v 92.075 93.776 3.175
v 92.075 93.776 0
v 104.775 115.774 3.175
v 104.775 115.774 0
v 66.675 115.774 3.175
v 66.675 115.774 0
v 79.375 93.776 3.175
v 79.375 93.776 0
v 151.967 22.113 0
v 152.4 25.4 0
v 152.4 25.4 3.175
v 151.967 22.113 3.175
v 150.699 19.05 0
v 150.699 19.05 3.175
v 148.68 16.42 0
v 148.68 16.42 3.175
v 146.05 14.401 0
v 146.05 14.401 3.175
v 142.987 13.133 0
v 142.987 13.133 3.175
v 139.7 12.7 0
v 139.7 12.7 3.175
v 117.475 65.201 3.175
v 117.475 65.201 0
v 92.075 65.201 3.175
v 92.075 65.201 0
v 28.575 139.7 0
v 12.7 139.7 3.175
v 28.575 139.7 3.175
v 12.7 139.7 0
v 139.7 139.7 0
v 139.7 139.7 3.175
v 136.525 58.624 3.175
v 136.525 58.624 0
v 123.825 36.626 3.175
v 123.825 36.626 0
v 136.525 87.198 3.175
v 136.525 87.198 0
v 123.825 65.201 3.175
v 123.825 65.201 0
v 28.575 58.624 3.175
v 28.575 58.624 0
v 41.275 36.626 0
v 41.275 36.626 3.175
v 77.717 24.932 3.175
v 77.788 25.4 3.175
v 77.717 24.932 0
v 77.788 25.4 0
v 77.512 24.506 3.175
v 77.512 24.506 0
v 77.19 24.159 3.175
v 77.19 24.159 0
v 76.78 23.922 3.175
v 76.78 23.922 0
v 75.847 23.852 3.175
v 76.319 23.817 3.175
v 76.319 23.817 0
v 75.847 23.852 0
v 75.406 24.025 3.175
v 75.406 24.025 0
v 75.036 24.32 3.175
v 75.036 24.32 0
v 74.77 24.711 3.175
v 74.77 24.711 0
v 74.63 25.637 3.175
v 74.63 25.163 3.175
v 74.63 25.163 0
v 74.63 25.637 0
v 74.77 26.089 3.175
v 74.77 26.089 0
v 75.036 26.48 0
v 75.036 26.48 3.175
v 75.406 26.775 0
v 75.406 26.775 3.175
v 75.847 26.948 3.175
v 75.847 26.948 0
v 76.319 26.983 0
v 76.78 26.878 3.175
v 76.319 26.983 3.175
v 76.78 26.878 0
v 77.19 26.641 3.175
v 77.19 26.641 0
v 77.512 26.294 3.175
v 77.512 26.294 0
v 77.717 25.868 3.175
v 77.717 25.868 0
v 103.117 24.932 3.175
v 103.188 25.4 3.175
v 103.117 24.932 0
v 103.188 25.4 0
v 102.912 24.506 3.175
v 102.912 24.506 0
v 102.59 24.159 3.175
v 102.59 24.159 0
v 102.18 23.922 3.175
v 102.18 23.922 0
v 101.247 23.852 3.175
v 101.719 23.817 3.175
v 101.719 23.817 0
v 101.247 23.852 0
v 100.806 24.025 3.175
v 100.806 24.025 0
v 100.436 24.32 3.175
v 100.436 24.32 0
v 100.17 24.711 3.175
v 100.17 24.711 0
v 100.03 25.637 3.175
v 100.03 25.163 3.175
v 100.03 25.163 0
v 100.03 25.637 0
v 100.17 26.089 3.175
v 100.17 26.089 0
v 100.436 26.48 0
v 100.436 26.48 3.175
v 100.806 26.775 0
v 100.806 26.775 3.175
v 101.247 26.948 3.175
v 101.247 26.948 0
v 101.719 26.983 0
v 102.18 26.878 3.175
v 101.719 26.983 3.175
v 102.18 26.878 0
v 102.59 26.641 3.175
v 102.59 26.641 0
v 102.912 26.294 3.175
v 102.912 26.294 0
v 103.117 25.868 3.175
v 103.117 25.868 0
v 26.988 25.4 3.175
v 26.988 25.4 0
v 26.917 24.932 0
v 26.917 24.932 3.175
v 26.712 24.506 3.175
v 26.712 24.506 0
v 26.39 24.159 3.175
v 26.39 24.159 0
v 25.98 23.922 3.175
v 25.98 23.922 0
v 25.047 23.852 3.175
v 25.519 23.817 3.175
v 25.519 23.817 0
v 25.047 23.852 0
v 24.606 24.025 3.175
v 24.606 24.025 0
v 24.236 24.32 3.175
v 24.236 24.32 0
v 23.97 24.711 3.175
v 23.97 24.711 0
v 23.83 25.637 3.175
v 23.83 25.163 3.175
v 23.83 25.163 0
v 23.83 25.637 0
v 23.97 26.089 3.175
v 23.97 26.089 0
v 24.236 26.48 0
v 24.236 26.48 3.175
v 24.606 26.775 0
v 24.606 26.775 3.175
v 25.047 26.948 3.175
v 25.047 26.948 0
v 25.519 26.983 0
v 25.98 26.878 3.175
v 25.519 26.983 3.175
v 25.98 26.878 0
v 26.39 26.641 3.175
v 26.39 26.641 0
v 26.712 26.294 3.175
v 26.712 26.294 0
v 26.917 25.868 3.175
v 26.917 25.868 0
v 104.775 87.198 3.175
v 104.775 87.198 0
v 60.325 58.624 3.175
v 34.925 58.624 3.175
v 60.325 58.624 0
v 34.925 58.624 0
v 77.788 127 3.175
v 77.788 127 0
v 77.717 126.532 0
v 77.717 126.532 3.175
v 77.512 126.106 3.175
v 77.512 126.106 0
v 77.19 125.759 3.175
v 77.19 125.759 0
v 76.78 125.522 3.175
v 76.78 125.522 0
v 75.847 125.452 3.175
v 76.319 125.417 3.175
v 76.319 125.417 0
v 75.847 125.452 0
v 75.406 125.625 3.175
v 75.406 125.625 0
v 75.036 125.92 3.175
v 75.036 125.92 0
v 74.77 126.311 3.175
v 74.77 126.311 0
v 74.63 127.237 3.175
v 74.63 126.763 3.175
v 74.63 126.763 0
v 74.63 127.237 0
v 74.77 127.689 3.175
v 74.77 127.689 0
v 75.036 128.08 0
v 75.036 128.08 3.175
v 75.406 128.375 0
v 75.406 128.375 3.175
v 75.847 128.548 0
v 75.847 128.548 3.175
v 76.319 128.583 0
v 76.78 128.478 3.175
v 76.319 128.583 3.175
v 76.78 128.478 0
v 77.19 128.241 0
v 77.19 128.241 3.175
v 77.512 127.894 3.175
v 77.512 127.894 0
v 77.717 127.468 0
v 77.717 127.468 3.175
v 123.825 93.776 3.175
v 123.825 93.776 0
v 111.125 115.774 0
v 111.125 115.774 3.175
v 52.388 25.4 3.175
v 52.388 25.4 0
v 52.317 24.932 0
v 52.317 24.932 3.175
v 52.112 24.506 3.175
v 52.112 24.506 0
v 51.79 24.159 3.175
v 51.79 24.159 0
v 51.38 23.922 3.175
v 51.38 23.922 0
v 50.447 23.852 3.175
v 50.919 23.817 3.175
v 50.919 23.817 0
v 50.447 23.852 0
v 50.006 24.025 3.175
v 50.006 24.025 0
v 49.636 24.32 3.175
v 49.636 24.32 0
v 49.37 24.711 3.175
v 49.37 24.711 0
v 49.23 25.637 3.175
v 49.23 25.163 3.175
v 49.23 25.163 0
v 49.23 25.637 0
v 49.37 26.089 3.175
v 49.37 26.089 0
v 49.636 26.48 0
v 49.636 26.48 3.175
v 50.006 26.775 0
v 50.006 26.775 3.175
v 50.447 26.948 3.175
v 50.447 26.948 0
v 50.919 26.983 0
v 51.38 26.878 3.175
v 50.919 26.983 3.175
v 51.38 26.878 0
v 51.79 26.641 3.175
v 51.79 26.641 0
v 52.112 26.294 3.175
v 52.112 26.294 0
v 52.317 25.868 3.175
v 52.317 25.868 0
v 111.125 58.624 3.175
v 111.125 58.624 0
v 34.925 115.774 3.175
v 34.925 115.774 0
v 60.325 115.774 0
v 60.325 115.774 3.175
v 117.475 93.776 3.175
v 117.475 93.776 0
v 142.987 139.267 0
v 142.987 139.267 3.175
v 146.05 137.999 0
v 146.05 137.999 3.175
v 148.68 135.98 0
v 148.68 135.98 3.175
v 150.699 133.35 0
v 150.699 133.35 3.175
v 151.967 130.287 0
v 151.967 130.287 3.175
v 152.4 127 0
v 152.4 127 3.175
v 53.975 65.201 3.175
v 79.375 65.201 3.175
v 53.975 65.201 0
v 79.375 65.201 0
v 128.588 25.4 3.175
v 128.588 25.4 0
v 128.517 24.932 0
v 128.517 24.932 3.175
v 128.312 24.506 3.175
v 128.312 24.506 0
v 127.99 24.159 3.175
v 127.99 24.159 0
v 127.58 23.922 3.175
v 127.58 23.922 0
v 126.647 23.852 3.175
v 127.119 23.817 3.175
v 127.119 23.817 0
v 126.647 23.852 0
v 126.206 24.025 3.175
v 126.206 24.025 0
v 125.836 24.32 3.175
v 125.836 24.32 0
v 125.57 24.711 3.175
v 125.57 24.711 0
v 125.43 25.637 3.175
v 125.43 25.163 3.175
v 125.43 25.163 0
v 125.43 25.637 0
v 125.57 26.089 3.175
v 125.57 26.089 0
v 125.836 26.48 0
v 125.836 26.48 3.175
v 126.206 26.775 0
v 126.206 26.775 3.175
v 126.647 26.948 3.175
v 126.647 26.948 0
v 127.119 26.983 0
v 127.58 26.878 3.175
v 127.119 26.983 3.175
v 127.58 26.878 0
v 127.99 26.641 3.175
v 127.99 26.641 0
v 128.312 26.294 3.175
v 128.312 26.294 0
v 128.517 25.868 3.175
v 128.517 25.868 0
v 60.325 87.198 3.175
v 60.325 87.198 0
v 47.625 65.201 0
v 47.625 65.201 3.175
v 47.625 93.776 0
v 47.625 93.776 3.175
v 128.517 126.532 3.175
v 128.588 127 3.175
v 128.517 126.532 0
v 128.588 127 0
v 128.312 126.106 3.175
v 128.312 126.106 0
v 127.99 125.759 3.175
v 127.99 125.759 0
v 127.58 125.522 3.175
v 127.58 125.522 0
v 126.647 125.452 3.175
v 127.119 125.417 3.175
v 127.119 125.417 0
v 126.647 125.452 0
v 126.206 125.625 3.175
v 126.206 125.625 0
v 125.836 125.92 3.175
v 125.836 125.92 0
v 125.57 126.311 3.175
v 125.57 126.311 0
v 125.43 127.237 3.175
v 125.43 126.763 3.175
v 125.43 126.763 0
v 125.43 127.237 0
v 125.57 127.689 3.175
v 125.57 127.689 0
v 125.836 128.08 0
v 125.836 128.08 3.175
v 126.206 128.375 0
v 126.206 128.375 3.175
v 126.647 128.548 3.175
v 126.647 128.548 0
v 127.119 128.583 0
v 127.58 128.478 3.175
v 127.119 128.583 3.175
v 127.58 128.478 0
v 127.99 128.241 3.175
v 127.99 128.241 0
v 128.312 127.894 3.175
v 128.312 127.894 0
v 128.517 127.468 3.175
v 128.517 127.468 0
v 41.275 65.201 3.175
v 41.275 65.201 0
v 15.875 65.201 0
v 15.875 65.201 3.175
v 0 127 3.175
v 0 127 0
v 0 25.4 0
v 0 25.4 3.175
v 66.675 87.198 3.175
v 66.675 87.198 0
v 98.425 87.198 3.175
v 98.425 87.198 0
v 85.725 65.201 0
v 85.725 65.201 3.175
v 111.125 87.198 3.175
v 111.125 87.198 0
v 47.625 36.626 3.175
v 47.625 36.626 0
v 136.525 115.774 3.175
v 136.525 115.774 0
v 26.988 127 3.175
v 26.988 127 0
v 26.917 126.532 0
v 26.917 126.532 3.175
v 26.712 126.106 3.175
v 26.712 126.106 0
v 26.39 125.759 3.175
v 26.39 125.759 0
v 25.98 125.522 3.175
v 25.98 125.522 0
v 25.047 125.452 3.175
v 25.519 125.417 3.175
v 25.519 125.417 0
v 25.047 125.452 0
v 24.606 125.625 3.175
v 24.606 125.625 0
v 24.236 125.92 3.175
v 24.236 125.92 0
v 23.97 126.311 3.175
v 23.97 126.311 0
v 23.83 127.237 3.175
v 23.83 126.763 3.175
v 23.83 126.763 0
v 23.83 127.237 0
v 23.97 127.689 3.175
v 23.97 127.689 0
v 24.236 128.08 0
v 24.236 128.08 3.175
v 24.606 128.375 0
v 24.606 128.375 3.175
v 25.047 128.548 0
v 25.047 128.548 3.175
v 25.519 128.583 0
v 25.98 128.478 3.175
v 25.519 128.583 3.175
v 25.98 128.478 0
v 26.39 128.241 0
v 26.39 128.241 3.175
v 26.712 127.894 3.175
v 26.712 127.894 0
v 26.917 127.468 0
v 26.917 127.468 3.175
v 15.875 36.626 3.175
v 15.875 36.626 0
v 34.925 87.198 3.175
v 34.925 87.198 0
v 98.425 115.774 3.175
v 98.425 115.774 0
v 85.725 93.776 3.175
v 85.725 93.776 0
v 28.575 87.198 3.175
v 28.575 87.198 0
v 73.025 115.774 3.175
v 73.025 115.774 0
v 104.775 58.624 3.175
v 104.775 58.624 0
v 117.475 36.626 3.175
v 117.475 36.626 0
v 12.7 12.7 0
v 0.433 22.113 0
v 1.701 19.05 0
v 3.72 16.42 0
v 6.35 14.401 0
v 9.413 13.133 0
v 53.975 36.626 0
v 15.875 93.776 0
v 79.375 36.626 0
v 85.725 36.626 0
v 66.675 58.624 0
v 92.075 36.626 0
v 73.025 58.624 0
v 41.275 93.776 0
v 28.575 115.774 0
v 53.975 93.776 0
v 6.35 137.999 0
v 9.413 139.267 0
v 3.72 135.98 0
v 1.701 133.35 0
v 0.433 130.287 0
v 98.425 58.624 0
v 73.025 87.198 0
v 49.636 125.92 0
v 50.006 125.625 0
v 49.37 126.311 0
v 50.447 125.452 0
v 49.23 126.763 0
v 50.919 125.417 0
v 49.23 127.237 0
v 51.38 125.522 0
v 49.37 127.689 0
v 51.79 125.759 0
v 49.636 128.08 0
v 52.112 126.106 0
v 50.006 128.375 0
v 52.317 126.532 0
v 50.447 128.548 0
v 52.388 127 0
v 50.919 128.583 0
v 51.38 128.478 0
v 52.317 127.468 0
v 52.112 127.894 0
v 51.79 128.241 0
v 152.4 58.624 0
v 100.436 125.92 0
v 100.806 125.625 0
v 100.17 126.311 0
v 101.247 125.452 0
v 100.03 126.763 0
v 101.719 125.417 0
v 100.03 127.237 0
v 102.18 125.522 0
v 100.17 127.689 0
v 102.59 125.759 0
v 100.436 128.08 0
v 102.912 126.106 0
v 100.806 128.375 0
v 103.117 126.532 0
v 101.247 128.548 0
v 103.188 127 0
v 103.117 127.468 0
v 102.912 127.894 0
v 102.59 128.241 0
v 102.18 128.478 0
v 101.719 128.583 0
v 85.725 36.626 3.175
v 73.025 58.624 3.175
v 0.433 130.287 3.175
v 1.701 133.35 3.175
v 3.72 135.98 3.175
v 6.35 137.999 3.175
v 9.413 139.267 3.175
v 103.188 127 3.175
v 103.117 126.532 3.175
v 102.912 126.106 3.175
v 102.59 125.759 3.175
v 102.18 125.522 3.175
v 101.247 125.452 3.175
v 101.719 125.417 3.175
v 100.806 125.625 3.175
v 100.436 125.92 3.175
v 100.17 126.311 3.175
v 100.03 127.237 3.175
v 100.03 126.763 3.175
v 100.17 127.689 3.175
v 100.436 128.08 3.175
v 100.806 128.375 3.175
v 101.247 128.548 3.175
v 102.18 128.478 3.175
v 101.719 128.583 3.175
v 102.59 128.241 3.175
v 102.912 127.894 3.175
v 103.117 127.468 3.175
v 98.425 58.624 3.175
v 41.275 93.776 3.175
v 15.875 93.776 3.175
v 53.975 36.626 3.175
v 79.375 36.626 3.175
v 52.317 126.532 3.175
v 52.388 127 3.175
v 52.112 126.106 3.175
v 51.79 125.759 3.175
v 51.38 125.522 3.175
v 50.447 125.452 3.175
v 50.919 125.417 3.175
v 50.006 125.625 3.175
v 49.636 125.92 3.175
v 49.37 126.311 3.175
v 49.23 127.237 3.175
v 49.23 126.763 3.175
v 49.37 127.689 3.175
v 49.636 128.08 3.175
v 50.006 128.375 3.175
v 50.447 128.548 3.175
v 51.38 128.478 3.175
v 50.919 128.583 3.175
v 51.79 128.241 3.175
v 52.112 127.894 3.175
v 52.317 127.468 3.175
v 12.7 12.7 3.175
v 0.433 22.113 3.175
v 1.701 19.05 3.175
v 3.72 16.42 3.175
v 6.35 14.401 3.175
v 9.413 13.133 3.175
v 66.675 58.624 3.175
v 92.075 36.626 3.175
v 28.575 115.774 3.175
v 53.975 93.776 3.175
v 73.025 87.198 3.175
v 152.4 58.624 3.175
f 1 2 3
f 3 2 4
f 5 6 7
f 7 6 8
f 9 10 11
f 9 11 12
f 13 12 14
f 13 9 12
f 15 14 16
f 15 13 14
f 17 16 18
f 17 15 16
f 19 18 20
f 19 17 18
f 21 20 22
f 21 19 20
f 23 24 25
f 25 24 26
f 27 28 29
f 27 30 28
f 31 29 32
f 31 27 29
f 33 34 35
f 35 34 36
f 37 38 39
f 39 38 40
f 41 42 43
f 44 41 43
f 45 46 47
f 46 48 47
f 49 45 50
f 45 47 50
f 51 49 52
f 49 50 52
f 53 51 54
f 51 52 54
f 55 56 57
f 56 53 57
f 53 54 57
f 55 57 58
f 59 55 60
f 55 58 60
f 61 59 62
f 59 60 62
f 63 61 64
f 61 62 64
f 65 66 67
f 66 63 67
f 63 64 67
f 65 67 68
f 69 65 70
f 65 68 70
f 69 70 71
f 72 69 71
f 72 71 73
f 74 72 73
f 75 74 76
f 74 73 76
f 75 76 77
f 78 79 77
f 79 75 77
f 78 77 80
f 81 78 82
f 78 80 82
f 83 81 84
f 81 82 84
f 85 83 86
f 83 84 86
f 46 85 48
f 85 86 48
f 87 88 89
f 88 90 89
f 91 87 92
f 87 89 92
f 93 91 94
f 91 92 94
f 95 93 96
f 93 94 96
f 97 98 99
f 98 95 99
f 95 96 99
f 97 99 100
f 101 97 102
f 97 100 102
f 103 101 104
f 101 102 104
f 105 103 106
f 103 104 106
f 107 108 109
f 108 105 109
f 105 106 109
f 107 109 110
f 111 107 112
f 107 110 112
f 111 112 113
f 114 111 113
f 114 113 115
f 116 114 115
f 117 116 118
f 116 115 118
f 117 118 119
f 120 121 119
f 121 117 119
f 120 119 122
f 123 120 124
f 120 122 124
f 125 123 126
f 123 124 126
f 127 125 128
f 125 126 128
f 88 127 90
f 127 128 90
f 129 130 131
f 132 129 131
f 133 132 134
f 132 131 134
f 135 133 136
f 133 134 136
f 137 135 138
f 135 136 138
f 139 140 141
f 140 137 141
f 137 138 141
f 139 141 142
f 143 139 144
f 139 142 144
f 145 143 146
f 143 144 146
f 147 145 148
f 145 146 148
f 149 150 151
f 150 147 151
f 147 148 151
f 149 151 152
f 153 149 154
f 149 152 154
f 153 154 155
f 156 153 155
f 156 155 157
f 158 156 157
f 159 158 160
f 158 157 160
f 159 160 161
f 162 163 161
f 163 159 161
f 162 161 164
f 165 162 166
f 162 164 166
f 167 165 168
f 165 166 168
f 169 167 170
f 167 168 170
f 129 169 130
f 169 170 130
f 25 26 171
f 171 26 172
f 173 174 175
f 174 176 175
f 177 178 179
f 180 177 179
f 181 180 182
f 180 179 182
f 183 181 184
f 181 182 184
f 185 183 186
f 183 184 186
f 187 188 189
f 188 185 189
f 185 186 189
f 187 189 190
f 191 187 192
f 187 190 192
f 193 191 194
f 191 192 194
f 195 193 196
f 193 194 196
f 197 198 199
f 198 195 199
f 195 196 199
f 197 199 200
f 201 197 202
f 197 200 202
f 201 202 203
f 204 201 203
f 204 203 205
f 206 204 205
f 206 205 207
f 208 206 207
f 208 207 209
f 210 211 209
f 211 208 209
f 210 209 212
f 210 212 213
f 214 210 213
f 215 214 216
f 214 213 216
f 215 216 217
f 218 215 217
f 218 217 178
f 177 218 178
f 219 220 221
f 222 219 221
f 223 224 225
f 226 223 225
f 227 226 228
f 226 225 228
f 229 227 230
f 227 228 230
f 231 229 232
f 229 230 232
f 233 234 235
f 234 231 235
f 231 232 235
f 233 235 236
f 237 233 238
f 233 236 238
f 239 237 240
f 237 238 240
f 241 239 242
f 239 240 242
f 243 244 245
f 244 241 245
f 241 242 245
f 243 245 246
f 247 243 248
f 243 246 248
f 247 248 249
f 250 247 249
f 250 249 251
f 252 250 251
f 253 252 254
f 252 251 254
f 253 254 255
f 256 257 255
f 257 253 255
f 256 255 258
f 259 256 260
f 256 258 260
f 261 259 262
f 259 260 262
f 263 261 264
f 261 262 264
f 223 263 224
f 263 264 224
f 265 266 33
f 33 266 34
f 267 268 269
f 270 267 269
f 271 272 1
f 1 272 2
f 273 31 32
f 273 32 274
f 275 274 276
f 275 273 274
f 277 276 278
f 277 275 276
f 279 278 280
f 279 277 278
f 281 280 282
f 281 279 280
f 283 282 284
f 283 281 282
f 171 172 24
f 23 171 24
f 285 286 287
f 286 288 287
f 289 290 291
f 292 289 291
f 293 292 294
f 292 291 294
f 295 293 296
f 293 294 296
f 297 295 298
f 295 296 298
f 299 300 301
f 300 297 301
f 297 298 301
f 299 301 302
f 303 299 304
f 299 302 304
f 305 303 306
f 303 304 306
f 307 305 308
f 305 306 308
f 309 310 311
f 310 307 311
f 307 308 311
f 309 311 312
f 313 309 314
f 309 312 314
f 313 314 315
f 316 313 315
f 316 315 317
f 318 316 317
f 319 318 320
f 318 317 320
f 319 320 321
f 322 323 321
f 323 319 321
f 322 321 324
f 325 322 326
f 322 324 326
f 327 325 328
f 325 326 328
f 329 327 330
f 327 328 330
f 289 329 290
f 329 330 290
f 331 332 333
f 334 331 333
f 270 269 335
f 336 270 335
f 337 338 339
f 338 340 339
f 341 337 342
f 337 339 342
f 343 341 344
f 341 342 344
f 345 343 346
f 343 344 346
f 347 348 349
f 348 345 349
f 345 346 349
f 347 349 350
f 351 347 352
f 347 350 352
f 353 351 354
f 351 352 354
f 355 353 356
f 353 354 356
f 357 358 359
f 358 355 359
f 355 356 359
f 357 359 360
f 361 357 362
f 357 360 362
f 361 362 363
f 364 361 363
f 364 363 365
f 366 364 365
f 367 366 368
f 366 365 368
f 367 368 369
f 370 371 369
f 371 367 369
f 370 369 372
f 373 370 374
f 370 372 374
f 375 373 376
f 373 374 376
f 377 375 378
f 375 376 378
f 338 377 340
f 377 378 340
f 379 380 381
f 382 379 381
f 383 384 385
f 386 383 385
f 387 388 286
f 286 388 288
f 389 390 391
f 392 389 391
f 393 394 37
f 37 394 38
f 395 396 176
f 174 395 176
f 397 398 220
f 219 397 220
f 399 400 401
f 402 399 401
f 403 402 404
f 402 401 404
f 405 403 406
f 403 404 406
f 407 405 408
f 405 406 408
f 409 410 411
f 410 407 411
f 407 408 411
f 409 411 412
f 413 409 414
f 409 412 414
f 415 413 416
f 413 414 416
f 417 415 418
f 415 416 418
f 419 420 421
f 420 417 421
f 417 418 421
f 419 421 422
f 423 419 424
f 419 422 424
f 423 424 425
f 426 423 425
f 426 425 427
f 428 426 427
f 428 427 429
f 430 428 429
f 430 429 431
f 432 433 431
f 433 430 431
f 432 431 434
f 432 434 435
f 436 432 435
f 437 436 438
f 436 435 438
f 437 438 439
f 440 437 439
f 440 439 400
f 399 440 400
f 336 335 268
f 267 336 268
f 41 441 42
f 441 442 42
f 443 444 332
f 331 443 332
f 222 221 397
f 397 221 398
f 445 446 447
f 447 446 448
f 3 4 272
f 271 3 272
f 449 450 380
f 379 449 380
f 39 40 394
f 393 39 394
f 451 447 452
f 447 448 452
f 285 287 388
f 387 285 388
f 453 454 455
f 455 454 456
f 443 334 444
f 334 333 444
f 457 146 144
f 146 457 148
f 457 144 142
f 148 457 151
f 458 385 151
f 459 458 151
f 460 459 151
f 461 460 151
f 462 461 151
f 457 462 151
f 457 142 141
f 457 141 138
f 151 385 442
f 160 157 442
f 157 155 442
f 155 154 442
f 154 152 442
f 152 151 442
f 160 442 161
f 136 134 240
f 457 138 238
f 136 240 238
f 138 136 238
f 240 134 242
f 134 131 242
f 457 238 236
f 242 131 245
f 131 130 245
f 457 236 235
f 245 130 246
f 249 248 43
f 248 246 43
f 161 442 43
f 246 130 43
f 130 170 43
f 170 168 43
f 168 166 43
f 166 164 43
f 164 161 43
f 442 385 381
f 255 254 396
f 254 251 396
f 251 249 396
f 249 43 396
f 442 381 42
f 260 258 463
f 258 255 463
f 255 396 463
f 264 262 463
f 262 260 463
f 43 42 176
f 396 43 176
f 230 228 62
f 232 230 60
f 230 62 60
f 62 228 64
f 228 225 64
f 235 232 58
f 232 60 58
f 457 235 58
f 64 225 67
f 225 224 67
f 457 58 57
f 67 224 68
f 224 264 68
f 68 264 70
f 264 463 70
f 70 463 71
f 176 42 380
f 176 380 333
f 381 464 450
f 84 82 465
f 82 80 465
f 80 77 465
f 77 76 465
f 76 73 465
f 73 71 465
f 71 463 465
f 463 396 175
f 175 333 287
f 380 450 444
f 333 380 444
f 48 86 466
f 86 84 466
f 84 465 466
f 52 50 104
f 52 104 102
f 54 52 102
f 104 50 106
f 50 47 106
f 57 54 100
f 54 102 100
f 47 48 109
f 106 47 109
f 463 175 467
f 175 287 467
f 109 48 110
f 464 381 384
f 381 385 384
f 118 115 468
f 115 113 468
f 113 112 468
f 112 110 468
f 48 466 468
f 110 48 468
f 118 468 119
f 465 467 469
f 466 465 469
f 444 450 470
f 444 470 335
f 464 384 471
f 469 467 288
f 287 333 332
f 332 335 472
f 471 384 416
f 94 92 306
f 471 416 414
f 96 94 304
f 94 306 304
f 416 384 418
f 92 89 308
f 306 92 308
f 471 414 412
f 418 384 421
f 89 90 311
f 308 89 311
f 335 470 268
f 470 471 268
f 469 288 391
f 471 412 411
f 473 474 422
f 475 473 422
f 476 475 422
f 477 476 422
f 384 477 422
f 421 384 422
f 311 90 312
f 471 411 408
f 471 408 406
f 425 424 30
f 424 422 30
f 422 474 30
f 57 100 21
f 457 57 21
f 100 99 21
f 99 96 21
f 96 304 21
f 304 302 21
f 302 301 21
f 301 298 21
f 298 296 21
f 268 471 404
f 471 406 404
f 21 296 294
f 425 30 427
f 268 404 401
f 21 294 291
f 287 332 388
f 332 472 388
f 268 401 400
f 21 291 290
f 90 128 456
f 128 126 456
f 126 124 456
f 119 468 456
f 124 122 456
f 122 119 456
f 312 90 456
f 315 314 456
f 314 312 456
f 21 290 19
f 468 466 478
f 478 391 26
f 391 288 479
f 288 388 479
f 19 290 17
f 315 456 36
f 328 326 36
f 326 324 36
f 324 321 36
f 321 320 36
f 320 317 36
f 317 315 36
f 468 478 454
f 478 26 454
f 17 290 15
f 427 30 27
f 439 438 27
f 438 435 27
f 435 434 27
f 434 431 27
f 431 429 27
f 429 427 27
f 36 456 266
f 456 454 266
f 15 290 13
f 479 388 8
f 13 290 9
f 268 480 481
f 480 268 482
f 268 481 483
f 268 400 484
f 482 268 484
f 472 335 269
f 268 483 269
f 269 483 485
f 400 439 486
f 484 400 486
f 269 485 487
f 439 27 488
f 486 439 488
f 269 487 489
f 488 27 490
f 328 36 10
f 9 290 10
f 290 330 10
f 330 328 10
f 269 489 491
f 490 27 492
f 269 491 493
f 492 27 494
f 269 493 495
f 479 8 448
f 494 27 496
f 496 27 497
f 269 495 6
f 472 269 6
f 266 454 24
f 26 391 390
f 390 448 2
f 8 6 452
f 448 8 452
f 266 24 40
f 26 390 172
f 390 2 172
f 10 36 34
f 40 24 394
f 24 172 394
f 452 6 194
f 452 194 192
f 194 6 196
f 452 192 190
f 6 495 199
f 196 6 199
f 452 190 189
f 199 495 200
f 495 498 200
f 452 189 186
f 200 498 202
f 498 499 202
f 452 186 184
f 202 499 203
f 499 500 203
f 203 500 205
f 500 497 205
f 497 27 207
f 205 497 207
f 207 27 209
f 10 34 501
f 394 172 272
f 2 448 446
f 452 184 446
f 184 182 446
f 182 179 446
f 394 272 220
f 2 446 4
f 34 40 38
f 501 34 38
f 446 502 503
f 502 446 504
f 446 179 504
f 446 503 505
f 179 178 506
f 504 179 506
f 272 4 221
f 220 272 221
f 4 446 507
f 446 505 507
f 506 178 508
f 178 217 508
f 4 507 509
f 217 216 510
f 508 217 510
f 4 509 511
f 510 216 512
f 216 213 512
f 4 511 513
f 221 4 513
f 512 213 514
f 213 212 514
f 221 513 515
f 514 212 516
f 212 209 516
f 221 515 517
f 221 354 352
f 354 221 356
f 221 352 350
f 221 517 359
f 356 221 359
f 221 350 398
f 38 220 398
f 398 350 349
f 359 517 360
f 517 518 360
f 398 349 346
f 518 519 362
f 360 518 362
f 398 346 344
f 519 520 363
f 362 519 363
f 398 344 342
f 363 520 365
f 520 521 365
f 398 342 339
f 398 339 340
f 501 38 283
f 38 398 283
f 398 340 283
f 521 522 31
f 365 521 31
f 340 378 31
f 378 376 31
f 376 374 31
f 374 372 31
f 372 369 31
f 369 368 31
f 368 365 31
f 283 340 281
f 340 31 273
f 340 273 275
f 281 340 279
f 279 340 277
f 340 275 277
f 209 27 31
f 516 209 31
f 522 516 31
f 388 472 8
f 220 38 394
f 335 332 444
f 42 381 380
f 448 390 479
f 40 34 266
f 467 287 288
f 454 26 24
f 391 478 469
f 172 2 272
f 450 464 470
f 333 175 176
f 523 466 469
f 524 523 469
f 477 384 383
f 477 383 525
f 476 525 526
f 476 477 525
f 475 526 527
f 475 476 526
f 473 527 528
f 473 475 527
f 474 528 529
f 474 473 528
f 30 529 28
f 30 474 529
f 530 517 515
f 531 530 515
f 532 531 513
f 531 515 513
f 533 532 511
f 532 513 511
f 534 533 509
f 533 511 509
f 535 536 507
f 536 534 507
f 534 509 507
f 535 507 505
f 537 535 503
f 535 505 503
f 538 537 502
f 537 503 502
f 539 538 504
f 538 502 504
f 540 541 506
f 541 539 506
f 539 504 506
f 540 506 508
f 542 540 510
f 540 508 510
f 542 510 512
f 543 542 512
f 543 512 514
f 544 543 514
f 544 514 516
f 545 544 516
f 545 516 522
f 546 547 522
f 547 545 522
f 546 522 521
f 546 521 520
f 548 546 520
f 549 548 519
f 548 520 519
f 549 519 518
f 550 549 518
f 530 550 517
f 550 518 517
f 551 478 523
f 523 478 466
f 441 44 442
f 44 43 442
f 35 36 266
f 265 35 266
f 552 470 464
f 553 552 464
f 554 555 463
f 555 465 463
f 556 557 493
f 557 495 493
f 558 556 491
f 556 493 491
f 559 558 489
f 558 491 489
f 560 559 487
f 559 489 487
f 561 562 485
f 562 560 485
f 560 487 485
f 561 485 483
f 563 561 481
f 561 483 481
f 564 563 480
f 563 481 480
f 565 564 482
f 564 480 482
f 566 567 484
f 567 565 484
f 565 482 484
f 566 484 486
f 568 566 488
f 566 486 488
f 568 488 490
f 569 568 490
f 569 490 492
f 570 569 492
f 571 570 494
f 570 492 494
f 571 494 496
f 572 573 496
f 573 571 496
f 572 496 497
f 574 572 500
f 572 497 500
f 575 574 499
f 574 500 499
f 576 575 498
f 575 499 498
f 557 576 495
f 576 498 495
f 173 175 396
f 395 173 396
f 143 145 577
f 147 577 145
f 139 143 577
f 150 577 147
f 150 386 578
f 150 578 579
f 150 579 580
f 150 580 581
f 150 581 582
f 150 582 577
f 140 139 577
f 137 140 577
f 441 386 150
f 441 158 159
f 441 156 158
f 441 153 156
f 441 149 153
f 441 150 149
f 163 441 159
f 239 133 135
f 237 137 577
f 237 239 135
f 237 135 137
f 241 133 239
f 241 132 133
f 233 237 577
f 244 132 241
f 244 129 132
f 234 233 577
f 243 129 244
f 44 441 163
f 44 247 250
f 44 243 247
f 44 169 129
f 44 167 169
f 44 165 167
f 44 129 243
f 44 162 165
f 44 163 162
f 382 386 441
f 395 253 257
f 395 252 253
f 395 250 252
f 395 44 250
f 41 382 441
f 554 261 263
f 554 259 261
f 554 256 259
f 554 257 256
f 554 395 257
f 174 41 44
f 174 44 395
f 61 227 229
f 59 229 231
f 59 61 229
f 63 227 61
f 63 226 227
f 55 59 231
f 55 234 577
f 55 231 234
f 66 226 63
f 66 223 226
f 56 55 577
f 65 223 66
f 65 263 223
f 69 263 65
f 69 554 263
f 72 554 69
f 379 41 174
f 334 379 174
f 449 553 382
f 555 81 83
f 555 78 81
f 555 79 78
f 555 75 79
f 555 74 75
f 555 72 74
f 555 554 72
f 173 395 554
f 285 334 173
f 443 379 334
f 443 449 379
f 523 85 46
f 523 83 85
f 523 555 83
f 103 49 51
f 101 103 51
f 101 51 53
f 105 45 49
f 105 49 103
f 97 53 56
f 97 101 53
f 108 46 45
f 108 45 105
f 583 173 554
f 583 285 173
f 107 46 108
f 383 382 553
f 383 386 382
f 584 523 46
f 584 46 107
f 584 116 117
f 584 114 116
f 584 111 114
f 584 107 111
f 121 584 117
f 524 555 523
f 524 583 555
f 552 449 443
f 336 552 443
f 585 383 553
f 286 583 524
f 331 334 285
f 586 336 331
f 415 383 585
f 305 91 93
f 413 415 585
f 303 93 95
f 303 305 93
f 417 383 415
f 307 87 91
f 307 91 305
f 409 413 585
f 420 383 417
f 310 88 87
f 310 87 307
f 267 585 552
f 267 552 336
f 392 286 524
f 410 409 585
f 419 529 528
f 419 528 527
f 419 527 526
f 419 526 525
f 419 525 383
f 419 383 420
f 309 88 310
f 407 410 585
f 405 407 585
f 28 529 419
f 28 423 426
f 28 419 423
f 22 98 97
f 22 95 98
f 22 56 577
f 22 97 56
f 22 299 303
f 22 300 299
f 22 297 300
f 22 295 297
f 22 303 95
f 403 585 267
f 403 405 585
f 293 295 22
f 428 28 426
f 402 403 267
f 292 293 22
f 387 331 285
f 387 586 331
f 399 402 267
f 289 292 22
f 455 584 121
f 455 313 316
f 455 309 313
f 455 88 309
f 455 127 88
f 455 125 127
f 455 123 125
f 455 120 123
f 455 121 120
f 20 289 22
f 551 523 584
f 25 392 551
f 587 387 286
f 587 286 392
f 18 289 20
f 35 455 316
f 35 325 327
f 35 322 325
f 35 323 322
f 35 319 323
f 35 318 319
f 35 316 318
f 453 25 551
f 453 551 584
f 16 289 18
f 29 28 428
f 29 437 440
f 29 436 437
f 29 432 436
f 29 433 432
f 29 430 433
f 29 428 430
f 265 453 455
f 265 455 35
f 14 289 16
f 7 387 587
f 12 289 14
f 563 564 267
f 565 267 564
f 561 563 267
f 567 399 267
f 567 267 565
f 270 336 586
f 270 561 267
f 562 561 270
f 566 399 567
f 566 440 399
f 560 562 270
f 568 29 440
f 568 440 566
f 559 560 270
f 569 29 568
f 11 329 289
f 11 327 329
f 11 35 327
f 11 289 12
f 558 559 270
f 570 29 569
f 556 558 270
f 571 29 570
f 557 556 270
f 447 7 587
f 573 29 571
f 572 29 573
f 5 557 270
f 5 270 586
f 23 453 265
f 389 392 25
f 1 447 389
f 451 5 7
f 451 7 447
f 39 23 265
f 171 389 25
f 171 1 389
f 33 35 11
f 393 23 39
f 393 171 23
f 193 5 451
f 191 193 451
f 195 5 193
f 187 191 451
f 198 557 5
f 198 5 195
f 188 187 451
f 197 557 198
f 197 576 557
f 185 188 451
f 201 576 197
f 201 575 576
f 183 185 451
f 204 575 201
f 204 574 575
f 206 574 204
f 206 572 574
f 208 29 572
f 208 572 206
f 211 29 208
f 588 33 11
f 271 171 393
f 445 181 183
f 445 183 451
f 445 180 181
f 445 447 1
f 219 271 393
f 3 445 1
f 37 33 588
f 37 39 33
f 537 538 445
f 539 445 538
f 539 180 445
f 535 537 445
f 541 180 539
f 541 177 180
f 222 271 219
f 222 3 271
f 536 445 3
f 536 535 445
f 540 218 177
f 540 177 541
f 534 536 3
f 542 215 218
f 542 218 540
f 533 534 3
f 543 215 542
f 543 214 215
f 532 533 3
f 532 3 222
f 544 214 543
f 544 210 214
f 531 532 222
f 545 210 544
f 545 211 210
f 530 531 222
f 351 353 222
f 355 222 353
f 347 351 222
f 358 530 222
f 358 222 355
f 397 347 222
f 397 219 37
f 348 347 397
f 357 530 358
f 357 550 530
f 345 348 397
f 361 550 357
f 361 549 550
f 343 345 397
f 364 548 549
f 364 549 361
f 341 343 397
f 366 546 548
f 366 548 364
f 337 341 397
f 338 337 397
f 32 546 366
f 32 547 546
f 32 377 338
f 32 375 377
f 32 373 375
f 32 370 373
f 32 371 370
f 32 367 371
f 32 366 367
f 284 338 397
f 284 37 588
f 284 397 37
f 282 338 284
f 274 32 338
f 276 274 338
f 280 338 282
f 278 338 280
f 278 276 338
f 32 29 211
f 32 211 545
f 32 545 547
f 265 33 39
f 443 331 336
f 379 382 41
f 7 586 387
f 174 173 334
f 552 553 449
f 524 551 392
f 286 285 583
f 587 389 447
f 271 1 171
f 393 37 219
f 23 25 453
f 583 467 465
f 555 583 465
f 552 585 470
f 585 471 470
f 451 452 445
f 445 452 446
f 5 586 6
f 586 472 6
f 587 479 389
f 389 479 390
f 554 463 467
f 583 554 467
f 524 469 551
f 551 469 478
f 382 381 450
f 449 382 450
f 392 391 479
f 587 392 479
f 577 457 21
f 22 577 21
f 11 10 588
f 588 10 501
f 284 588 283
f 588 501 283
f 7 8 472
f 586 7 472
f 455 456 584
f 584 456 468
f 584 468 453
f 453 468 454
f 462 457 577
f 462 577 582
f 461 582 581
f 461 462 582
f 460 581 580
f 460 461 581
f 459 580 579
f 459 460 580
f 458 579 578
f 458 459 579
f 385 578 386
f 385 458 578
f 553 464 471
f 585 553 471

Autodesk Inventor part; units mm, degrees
ref_plane "YZ Plane" through (0, 0, 0) normal (1, 0, 0) x (0, 1, 0)
ref_plane "XZ Plane" through (0, 0, 0) normal (0, 1, 0) x (-1, 0, 0)
ref_plane "XY Plane" through (0, 0, 0) normal (0, 0, 1) x (1, 0, 0)
sketch "Sketch1" plane through (0, 0, 0) normal (0, 0, 1) x (1, 0, 0)
  line L0 (0, 0) -> (152.4, 0)
  line L1 (152.4, 25.4) -> (152.4, 127)
  line L2 (152.4, 152.4) -> (0, 152.4)
  line L3 (0, 127) -> (0, 25.4)
  circle A0 centre (25.4, 127) radius 1.5875
  circle A1 centre (50.8, 127) radius 1.5875
  circle A2 centre (76.2, 127) radius 1.5875
  circle A3 centre (101.6, 127) radius 1.5875
  circle A4 centre (127, 127) radius 1.5875
  circle A5 centre (25.4, 25.4) radius 1.5875
  circle A6 centre (50.8, 25.4) radius 1.5875
  circle A7 centre (76.2, 25.4) radius 1.5875
  circle A8 centre (101.6, 25.4) radius 1.5875
  circle A9 centre (127, 25.4) radius 1.5875
  line L4 (41.275, 36.6265) -> (15.875, 36.6265)
  line L5 (15.875, 36.6265) -> (28.575, 58.6235)
  line L6 (28.575, 58.6235) -> (41.275, 36.6265)
  line L7 (60.325, 58.6235) -> (47.625, 36.6265)
  line L8 (47.625, 36.6265) -> (34.925, 58.6235)
  line L9 (34.925, 58.6235) -> (60.325, 58.6235)
  line L10 (98.425, 58.6235) -> (85.725, 36.6265)
  line L11 (73.025, 58.6235) -> (98.425, 58.6235)
  line L12 (85.725, 36.6265) -> (73.025, 58.6235)
  line L13 (66.675, 58.6235) -> (79.375, 36.6265)
  line L14 (53.975, 36.6265) -> (66.675, 58.6235)
  line L15 (79.375, 36.6265) -> (53.975, 36.6265)
  line L16 (136.525, 58.6235) -> (123.825, 36.6265)
  line L17 (111.125, 58.6235) -> (136.525, 58.6235)
  line L18 (123.825, 36.6265) -> (111.125, 58.6235)
  line L19 (104.775, 58.6235) -> (117.475, 36.6265)
  line L20 (92.075, 36.6265) -> (104.775, 58.6235)
  line L21 (117.475, 36.6265) -> (92.075, 36.6265)
  line L22 (0, 36.6265) -> (15.875, 36.6265)
  line L23 (136.525, 58.6235) -> (152.4, 58.6235)
  line L24 (104.775, 87.1985) -> (117.475, 65.2015)
  line L25 (123.825, 65.2015) -> (111.125, 87.1985)
  line L26 (136.525, 87.1985) -> (123.825, 65.2015)
  line L27 (111.125, 87.1985) -> (136.525, 87.1985)
  line L28 (117.475, 65.2015) -> (92.075, 65.2015)
  line L29 (41.275, 65.2015) -> (15.875, 65.2015)
  line L30 (15.875, 65.2015) -> (28.575, 87.1985)
  line L31 (28.575, 87.1985) -> (41.275, 65.2015)
  line L32 (60.325, 87.1985) -> (47.625, 65.2015)
  line L33 (47.625, 65.2015) -> (34.925, 87.1985)
  line L34 (34.925, 87.1985) -> (60.325, 87.1985)
  line L35 (92.075, 65.2015) -> (104.775, 87.1985)
  line L36 (73.025, 87.1985) -> (98.425, 87.1985)
  line L37 (85.725, 65.2015) -> (73.025, 87.1985)
  line L38 (66.675, 87.1985) -> (79.375, 65.2015)
  line L39 (53.975, 65.2015) -> (66.675, 87.1985)
  line L40 (79.375, 65.2015) -> (53.975, 65.2015)
  line L41 (98.425, 87.1985) -> (85.725, 65.2015)
  line L42 (104.775, 115.7735) -> (117.475, 93.7765)
  line L43 (123.825, 93.7765) -> (111.125, 115.7735)
  line L44 (136.525, 115.7735) -> (123.825, 93.7765)
  line L45 (111.125, 115.7735) -> (136.525, 115.7735)
  line L46 (117.475, 93.7765) -> (92.075, 93.7765)
  line L47 (41.275, 93.7765) -> (15.875, 93.7765)
  line L48 (15.875, 93.7765) -> (28.575, 115.7735)
  line L49 (28.575, 115.7735) -> (41.275, 93.7765)
  line L50 (60.325, 115.7735) -> (47.625, 93.7765)
  line L51 (47.625, 93.7765) -> (34.925, 115.7735)
  line L52 (34.925, 115.7735) -> (60.325, 115.7735)
  line L53 (92.075, 93.7765) -> (104.775, 115.7735)
  line L54 (73.025, 115.7735) -> (98.425, 115.7735)
  line L55 (85.725, 93.7765) -> (73.025, 115.7735)
  line L56 (66.675, 115.7735) -> (79.375, 93.7765)
  line L57 (53.975, 93.7765) -> (66.675, 115.7735)
  line L58 (79.375, 93.7765) -> (53.975, 93.7765)
  line L59 (98.425, 115.7735) -> (85.725, 93.7765)
  line L60 (15.875, 36.6265) -> (15.875, 0)
  line L61 (28.575, 115.7735) -> (28.575, 152.4)
  line L62 (12.7, 12.7) -> (139.7, 12.7)
  line L63 (12.7, 139.7) -> (139.7, 139.7)
  arc A10 (0, 25.4) -> (12.7, 12.7) centre (12.7, 25.4) ccw
  arc A11 (139.7, 12.7) -> (152.4, 25.4) centre (139.7, 25.4) ccw
  arc A12 (152.4, 127) -> (139.7, 139.7) centre (139.7, 127) ccw
  arc A13 (12.7, 139.7) -> (0, 127) centre (12.7, 127) ccw
  point P0 (28.575, 43.9588)
  point P1 (28.575, 36.6265)
  point P2 (47.625, 51.2912)
  point P3 (85.725, 51.2912)
  point P4 (66.675, 43.9588)
  point P5 (66.675, 36.6265)
  point P6 (123.825, 51.2912)
  point P7 (104.775, 43.9588)
  point P8 (104.775, 36.6265)
  point P9 (123.825, 79.8662)
  point P10 (104.775, 65.2015)
  point P11 (28.575, 72.5338)
  point P12 (28.575, 65.2015)
  point P13 (47.625, 79.8662)
  point P14 (104.775, 72.5338)
  point P15 (85.725, 79.8662)
  point P16 (66.675, 72.5338)
  point P17 (66.675, 65.2015)
  point P18 (123.825, 108.4412)
  point P19 (104.775, 93.7765)
  point P20 (28.575, 101.1088)
  point P21 (28.575, 93.7765)
  point P22 (47.625, 108.4412)
  point P23 (104.775, 101.1088)
  point P24 (85.725, 108.4412)
  point P25 (66.675, 101.1088)
  point P26 (66.675, 93.7765)
  dimension "d0" = 152.4
  dimension "d1" = 152.4
  dimension "d2" = 3.175
  dimension "d3" = 25.4
  dimension "d4" = 25.4
  dimension "d7" = 25.4
  dimension "d12" = 3.175
  dimension "d13" = 25.4
  dimension "d14" = 25.4
  dimension "d17" = 25.4
  dimension "d22" = 25.4
  dimension "d23" = 25.4
  dimension "d24" = 0
  dimension "d25" = 6.35
  dimension "d29" = 38.1
  dimension "d37" = 28.575
  dimension "d42" = 12.7
  dimension "d43" = 12.7
  dimension "d44" = 12.7
extrude "Extrusion1" add sketch "Sketch1" along normal blind 3.175
properties part number "Low Frame to Mid Frame bracket"
